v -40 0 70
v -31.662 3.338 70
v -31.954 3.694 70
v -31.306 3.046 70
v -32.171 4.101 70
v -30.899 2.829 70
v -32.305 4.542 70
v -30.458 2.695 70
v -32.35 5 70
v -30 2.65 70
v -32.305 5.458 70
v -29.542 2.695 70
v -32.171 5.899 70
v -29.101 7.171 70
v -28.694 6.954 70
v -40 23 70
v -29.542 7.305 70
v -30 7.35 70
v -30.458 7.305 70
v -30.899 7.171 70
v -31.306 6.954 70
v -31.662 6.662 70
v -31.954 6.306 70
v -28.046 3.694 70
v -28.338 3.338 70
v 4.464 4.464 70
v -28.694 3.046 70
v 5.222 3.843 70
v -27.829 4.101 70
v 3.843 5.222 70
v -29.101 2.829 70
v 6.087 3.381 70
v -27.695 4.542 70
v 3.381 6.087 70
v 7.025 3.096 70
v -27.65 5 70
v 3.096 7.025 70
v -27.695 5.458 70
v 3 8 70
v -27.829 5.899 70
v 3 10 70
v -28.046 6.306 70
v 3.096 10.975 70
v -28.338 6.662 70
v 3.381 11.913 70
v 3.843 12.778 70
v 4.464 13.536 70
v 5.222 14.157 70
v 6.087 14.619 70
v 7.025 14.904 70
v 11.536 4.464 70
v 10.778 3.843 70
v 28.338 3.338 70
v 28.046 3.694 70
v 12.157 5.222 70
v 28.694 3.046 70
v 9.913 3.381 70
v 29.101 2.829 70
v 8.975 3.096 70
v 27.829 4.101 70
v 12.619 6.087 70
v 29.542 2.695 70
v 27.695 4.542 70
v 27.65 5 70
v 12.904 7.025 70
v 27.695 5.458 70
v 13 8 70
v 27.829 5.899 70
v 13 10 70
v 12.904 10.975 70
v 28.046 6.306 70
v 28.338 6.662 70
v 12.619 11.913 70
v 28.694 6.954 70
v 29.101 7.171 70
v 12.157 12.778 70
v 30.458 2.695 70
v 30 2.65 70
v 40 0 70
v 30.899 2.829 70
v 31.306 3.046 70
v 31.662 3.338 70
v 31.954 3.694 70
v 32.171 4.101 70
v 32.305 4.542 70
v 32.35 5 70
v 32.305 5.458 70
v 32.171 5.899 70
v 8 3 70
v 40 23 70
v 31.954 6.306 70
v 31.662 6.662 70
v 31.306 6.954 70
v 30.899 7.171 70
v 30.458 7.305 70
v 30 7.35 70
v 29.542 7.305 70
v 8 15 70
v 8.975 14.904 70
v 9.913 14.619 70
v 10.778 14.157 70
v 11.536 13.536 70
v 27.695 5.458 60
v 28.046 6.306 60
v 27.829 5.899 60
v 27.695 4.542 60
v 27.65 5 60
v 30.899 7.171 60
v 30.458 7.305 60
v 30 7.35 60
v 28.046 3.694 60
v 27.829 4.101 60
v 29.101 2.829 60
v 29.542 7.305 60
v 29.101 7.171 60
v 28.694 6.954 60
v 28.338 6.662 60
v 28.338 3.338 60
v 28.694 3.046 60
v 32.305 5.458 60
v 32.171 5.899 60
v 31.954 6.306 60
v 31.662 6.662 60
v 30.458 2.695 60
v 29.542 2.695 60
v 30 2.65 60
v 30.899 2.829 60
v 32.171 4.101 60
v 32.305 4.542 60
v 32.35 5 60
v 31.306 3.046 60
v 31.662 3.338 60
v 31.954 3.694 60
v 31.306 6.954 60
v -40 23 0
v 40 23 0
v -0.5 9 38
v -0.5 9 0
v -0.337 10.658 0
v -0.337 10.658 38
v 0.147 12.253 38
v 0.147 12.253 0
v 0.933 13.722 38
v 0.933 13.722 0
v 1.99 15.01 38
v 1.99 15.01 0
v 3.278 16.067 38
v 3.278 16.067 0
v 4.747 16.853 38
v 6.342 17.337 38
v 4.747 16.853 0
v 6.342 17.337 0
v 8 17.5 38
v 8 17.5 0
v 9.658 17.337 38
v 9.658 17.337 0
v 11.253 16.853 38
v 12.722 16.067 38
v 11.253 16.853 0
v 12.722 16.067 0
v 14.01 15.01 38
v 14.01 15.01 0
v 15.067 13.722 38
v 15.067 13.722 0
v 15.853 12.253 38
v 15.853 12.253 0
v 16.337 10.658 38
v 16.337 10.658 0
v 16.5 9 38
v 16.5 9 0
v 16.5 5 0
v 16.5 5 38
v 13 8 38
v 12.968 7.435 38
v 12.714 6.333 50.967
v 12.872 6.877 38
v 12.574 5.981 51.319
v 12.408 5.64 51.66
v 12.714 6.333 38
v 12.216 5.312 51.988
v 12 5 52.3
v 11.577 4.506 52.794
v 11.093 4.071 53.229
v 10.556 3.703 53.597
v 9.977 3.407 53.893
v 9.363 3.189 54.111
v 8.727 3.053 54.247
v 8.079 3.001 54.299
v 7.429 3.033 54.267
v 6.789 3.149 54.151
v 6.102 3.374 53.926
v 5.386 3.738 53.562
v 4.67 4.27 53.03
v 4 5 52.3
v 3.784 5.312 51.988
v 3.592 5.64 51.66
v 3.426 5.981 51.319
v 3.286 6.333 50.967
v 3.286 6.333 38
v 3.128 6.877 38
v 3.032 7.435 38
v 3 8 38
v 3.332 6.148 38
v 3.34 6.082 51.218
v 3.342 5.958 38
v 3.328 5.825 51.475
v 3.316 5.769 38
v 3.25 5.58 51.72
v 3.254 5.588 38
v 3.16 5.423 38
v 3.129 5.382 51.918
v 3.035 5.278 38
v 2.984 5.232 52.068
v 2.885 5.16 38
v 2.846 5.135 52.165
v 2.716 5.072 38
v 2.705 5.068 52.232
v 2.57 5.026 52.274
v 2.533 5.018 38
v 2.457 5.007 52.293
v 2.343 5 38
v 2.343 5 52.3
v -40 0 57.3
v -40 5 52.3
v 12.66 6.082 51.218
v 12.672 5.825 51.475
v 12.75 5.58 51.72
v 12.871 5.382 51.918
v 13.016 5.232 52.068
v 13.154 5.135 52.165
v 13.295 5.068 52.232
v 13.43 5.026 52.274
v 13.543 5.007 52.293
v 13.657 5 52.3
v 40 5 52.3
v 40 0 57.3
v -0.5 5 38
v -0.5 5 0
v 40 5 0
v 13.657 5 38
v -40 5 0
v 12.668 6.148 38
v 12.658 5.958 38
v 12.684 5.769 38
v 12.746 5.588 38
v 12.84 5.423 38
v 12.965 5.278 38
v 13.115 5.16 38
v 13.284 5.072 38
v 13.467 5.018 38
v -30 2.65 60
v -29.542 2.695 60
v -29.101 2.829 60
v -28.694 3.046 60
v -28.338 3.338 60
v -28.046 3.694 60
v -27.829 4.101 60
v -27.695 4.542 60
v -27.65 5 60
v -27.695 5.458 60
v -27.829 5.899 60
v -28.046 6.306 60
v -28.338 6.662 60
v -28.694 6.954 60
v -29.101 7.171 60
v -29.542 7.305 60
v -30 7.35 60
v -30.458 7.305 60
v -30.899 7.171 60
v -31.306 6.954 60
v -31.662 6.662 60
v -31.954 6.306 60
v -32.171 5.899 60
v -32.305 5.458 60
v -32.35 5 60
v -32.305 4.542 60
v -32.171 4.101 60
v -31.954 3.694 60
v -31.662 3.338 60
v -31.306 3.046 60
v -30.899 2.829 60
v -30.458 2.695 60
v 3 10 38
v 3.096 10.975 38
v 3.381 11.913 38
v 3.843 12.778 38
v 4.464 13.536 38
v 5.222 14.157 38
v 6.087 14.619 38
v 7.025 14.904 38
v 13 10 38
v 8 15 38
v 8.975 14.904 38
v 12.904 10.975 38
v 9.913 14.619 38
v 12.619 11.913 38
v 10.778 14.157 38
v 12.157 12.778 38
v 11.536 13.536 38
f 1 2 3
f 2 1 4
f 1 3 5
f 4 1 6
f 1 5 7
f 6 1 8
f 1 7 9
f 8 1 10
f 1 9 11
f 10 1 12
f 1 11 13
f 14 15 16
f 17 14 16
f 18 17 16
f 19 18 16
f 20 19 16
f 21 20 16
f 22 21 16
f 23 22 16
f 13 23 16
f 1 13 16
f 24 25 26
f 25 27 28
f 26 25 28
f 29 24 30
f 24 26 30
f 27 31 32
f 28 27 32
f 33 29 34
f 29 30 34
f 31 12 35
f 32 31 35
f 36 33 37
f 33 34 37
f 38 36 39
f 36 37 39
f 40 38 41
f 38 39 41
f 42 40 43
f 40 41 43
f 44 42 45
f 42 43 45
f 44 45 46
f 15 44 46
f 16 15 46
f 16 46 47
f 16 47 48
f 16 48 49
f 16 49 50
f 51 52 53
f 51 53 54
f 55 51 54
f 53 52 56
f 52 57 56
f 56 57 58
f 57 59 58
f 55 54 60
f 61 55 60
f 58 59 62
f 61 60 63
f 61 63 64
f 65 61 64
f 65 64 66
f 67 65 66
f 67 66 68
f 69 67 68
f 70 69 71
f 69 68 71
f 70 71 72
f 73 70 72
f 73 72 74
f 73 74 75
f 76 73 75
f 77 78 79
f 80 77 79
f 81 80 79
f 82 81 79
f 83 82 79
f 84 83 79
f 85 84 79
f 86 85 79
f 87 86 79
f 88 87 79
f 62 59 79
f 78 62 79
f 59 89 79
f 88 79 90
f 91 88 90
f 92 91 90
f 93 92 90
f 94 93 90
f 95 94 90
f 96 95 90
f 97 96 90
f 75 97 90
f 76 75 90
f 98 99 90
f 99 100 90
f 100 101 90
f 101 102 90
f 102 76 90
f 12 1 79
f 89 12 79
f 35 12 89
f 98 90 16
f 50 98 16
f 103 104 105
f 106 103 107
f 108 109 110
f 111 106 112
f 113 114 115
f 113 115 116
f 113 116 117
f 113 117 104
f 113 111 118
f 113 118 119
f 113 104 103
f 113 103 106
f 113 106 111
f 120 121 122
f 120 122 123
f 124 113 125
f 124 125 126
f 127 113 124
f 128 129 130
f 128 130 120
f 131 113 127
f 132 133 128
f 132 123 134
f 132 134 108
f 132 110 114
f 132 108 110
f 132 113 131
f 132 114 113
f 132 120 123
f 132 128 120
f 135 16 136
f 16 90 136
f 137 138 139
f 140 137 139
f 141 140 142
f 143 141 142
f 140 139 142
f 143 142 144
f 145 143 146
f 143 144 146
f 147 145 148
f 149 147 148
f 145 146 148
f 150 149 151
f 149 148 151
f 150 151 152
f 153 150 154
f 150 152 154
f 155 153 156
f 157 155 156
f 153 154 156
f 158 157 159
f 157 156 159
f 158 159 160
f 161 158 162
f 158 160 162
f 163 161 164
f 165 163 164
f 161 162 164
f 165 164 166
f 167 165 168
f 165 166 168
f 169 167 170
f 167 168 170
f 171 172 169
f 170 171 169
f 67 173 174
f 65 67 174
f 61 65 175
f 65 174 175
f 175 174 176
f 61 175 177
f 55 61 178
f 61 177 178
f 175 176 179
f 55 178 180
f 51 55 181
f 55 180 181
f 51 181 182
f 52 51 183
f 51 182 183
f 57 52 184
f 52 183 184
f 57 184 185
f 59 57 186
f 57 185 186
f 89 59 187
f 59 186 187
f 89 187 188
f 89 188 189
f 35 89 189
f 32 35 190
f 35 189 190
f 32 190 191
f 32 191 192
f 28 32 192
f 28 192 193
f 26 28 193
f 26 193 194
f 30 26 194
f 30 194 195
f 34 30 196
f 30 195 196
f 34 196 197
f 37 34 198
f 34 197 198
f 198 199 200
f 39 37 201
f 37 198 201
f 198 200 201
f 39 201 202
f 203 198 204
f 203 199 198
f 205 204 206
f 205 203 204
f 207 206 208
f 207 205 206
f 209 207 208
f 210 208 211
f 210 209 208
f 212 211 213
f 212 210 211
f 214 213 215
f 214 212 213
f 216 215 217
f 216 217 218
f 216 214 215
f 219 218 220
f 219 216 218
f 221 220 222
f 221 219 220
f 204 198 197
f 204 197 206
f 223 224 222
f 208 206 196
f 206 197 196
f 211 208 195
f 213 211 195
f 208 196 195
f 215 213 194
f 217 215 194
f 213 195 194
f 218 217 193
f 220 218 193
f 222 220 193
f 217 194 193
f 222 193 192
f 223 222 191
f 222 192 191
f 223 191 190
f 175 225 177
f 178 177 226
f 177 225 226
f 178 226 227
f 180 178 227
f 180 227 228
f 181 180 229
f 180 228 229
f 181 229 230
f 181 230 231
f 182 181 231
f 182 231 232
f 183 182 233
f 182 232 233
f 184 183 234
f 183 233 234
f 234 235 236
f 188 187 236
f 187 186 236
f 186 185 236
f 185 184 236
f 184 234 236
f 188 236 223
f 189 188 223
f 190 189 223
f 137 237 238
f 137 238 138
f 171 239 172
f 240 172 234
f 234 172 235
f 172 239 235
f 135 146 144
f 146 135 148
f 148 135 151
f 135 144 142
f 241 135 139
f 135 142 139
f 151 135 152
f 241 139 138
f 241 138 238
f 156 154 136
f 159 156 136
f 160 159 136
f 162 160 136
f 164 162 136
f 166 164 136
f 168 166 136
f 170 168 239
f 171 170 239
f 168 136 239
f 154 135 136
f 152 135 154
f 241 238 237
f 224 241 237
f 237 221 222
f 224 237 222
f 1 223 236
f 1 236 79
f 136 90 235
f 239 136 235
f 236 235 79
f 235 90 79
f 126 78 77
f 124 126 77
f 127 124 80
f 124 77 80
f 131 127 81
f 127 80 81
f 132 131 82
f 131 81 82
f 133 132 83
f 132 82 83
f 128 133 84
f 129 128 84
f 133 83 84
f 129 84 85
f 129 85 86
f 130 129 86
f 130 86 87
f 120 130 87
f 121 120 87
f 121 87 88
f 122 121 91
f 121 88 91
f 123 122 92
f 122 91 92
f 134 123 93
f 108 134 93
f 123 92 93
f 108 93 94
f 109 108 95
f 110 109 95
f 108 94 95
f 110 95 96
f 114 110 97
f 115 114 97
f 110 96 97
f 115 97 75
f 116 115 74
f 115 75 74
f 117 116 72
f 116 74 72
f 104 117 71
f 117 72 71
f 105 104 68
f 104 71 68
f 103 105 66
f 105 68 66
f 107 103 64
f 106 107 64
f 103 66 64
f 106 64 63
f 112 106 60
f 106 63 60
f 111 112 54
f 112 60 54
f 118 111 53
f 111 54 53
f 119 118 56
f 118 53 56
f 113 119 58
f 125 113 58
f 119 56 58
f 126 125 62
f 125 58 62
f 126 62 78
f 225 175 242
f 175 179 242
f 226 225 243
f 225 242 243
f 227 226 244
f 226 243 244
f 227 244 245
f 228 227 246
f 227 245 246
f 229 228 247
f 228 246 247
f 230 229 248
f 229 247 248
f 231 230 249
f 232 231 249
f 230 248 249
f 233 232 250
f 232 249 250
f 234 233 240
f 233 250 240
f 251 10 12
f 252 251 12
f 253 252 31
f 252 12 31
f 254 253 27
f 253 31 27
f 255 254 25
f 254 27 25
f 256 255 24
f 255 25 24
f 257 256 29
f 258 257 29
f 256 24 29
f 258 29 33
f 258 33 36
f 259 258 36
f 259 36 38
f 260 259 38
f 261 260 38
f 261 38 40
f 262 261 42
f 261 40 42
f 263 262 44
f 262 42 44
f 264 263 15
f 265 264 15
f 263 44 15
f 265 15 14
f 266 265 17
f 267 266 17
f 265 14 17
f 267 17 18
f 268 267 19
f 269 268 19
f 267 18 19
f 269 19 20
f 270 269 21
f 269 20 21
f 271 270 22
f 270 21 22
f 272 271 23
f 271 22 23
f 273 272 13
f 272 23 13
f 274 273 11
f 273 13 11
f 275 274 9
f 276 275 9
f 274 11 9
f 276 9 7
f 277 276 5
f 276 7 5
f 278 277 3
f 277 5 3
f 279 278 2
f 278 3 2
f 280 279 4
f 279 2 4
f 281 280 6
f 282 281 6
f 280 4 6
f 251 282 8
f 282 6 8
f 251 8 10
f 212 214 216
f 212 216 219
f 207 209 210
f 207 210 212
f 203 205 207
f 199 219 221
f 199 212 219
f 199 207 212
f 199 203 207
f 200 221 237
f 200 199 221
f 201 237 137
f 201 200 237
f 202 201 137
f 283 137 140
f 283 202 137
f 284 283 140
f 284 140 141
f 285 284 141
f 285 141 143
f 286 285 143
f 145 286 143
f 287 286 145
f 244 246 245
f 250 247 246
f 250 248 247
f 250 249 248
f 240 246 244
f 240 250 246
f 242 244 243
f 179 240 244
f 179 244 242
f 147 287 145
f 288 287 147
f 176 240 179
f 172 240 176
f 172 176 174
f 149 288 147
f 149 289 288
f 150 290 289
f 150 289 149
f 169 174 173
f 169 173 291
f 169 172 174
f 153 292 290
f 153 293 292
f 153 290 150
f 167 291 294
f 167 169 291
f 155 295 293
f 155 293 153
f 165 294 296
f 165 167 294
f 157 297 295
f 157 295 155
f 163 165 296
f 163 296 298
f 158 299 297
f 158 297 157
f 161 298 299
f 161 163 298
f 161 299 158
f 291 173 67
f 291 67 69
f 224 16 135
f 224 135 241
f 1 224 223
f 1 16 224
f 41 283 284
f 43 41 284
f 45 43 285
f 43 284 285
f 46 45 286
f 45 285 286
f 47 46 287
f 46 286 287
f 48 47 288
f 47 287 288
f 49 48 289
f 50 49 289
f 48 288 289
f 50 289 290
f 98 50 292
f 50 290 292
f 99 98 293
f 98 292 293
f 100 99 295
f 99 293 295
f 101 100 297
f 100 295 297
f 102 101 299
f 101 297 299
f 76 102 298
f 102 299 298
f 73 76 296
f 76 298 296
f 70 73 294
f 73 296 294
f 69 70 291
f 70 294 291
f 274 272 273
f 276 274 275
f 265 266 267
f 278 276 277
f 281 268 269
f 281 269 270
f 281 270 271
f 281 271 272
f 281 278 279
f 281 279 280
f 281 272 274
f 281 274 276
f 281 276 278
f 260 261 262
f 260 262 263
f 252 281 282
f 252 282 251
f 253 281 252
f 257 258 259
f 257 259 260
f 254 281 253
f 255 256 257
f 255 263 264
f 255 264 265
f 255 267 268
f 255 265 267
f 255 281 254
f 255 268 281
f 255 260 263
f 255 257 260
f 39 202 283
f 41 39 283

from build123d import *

# Parameters (mm, degrees)
PAD008_DEPTH    = 40
POCKET019_DEPTH = 38
SKETCH042_R     = 2.35
POCKET020_DEPTH = 10
SKETCH044_R     = 1.4
POCKET023_DEPTH = 11
POCKET024_DEPTH = 52
FILLET001_R     = 1


with BuildPart() as part:
    # Sketch039 → Pad008 (new body, symmetric)
    with BuildSketch(Plane.YZ):
        Polygon((0, 70), (23, 70), (23, 0), (5, 0), (5, 52.3), (0, 57.3), align=None)
    extrude(amount=PAD008_DEPTH, both=True)

    # Sketch035 (on Face3 of Pad008) → Pocket019 (cut)
    with BuildSketch(Plane.YX):
        with BuildLine():
            ThreePointArc((-8.818597, 16.5), (-17.318597, 8), (-8.818597, -0.5))
            Line((-8.818597, -0.5), (9, -0.5))
            ThreePointArc((9, -0.5), (17.5, 8), (9, 16.5))
            Line((-8.818597, 16.5), (9, 16.5))
        make_face()
    extrude(amount=-POCKET019_DEPTH, mode=Mode.SUBTRACT)

    # Sketch042 (on Face1 of Pocket019) → Pocket020 (cut)
    with BuildSketch(Plane(origin=(0, 0, 70), x_dir=(0, -1, 0), z_dir=(0, 0, 1))):
        with Locations((-5, 30)):
            Circle(SKETCH042_R)
        with Locations((-5, -30)):
            Circle(SKETCH042_R)
    extrude(amount=-POCKET020_DEPTH, mode=Mode.SUBTRACT)

    # Sketch044 (on Face10 of Pocket020) → Pocket023 (cut)
    with BuildSketch(Plane(origin=(0, 5, 0), x_dir=(0, 0, -1), z_dir=(0, -1, 0))):
        with Locations((13, 30)):
            Circle(SKETCH044_R)
        with Locations((13, -30)):
            Circle(SKETCH044_R)
    extrude(amount=-POCKET023_DEPTH, mode=Mode.SUBTRACT)

    # Sketch048 (on Face12 of Pocket019) → Pocket024 (cut)
    with BuildSketch(Plane.YX.offset(-38)):
        with BuildLine():
            ThreePointArc((8, 13), (3, 8), (8, 3))
            Line((8, 3), (10, 3))
            ThreePointArc((10, 3), (15, 8), (10, 13))
            Line((8, 13), (10, 13))
        make_face()
    extrude(amount=-POCKET024_DEPTH, mode=Mode.SUBTRACT)

    # Fillet001
    fillet001_edges = [part.edges().sort_by_distance(p)[0] for p in [
        (12, 5, 45.15),
        (4, 5, 45.15),
    ]]
    fillet(fillet001_edges, radius=FILLET001_R)


solid = part.part
